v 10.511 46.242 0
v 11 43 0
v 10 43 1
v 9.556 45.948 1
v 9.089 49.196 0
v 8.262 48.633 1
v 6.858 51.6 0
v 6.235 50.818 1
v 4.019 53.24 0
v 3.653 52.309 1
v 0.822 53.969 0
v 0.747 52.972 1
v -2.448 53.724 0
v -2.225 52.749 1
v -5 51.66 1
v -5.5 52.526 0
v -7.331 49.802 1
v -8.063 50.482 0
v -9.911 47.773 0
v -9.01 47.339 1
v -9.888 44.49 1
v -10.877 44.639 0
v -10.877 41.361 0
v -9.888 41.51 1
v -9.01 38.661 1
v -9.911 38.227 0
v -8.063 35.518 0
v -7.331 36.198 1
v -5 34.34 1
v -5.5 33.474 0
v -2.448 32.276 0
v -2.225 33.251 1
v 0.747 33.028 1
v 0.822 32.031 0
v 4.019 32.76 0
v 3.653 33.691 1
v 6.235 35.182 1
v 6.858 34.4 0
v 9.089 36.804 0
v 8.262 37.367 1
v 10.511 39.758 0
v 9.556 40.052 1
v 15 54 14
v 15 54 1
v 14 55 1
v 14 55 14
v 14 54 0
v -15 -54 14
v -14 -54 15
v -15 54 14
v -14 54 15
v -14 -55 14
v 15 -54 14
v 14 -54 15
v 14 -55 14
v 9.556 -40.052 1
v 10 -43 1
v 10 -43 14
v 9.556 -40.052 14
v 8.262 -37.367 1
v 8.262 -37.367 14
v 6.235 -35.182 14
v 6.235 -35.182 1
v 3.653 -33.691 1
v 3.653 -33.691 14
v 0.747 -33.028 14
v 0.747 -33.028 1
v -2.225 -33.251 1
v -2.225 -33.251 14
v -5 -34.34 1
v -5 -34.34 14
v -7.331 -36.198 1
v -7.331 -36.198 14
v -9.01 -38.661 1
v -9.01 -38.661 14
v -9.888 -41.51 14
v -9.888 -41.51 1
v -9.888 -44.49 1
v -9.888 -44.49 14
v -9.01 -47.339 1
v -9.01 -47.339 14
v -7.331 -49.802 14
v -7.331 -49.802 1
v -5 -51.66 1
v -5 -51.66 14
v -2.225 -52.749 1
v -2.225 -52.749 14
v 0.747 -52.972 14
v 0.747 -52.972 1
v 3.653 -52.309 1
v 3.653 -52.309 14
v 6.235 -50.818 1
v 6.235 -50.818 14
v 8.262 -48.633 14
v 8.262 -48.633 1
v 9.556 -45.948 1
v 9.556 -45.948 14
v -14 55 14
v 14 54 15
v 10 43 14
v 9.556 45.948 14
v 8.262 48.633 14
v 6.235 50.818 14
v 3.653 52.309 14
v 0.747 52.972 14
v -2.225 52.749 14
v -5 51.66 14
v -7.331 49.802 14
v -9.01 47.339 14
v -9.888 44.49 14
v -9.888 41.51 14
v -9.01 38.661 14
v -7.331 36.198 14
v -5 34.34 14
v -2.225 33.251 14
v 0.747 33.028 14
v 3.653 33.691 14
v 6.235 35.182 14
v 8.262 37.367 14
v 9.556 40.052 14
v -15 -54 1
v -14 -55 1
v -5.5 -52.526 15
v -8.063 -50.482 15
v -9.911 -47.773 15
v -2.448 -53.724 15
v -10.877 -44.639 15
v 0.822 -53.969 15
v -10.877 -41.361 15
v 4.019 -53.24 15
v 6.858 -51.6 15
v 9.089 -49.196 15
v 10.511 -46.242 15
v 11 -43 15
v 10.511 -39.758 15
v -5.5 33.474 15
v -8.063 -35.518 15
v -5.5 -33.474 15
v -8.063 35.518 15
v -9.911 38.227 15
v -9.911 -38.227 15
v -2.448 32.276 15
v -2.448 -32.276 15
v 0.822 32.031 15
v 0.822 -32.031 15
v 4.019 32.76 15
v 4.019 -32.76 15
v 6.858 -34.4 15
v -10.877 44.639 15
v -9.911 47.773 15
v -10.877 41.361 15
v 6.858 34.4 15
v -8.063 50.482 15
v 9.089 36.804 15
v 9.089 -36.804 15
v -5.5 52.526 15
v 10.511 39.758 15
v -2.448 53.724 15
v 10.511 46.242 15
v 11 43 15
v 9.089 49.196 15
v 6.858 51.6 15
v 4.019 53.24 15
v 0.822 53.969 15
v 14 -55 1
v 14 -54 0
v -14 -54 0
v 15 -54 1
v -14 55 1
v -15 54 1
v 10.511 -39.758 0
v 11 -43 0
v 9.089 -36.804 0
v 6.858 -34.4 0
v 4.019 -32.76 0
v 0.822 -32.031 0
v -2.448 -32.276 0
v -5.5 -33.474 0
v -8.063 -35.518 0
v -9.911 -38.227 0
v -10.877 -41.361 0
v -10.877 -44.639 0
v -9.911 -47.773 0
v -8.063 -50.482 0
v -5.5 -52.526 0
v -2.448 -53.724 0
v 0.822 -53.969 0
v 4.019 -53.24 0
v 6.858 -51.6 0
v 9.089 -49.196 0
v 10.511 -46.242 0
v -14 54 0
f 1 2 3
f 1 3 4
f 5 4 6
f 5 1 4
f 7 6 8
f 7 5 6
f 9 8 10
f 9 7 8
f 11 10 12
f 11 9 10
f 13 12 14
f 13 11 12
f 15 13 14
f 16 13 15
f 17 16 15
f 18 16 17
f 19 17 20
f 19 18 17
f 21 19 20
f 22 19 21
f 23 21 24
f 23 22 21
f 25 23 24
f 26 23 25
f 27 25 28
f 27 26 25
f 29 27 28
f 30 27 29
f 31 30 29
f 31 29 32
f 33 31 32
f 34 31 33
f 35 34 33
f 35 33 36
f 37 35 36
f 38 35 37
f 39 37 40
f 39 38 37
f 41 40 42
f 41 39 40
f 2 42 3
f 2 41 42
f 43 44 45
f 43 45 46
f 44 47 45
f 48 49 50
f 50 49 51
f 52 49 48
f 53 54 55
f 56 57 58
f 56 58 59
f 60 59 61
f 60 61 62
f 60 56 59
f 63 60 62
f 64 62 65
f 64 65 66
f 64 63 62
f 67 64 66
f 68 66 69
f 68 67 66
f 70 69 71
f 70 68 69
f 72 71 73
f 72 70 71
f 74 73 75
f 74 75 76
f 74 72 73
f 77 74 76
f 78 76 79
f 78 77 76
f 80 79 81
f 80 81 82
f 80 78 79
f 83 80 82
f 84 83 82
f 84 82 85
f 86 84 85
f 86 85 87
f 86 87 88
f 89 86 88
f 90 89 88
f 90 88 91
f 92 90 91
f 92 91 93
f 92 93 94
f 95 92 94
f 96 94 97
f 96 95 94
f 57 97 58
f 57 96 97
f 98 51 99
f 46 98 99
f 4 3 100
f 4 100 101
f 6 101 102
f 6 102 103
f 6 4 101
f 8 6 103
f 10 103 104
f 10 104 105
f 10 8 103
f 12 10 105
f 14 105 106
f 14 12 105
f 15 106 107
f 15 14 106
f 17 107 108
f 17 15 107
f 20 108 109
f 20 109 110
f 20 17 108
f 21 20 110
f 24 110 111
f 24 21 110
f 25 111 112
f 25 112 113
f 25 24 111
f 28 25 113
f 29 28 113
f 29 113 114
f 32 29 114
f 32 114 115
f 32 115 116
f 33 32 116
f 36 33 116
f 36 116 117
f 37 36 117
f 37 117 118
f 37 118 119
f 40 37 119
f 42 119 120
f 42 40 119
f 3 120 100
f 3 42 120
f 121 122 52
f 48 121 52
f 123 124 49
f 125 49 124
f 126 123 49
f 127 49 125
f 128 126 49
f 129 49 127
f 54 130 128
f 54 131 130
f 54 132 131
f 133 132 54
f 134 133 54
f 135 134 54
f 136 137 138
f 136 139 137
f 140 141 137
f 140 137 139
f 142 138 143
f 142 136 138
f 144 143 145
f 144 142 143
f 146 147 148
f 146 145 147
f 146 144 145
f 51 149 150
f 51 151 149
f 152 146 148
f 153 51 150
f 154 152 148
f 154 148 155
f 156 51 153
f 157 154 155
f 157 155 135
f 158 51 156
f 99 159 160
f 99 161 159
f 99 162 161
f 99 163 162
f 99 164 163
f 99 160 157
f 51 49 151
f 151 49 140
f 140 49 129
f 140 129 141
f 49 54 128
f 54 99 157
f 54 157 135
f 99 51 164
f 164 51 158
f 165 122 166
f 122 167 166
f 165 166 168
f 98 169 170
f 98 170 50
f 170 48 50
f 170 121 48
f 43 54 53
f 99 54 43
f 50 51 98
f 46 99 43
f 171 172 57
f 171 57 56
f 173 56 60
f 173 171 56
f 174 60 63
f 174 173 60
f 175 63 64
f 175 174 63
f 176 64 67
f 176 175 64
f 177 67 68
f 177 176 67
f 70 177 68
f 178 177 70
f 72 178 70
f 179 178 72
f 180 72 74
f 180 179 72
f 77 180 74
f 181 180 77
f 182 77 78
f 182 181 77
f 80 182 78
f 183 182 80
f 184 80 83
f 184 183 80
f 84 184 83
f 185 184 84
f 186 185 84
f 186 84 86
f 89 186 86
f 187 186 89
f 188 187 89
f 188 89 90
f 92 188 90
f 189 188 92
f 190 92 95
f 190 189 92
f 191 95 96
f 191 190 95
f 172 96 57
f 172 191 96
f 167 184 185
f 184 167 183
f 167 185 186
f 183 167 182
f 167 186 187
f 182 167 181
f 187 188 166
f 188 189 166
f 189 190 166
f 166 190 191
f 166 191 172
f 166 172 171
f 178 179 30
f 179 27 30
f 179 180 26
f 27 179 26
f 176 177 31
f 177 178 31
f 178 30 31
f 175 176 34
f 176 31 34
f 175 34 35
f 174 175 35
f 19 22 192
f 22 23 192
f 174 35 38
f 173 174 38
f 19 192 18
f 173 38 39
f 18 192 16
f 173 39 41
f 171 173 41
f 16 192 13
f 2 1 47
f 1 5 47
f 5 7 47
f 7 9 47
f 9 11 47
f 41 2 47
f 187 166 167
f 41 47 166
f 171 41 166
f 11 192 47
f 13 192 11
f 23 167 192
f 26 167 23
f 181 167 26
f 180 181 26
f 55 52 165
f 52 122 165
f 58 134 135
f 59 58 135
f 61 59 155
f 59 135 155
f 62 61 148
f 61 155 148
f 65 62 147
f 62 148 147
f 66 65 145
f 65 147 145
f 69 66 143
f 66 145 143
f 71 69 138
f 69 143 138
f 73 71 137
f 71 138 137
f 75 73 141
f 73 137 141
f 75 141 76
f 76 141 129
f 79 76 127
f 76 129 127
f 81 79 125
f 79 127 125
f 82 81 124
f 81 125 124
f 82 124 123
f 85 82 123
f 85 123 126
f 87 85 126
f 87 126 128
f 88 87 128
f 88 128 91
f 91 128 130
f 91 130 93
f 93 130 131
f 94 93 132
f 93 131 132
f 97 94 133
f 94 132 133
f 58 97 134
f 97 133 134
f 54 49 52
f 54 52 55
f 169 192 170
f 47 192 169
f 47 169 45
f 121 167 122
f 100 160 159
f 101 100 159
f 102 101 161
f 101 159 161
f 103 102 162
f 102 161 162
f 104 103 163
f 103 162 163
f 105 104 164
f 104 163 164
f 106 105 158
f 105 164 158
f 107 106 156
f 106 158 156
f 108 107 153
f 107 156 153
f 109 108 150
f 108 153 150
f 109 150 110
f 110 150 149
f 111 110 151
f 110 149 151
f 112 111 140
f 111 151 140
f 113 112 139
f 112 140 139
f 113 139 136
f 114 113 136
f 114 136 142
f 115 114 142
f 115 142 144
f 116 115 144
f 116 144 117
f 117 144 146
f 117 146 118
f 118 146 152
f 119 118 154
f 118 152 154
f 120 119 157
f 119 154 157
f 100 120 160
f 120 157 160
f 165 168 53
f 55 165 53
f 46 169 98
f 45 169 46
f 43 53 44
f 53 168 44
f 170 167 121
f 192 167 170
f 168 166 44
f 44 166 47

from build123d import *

# Parameters (mm, degrees)
SKETCH1_W           = 30
SKETCH1_H           = 110
SKETCH1_R           = 10
BOSS_EXTRUDE1_DEPTH = 15
CHAMFER1_SIZE       = 1


with BuildPart() as part:
    # Sketch1 → Boss-Extrude1 (new body)
    with BuildSketch(Plane.XY):
        Rectangle(SKETCH1_W, SKETCH1_H)
        with Locations((0, 43)):
            Circle(SKETCH1_R, mode=Mode.SUBTRACT)
        with Locations((0, -43)):
            Circle(SKETCH1_R, mode=Mode.SUBTRACT)
    extrude(amount=BOSS_EXTRUDE1_DEPTH)

    # Chamfer1
    chamfer1_edges = [part.edges().sort_by_distance(p)[0] for p in [
        (-15, 0, 15),
        (-10, 43, 0),
        (-10, 43, 15),
        (0, -55, 15),
        (-10, -43, 0),
        (-10, -43, 15),
        (15, 0, 15),
        (0, -55, 0),
        (-15, 0, 0),
        (0, 55, 0),
        (15, 0, 0),
        (0, 55, 15),
        (15, -55, 7.5),
        (-15, -55, 7.5),
        (-15, 55, 7.5),
        (15, 55, 7.5),
    ]]
    chamfer(chamfer1_edges, length=CHAMFER1_SIZE - 0.0001)  # a hair under: the kernel refuses the full size


solid = part.part
